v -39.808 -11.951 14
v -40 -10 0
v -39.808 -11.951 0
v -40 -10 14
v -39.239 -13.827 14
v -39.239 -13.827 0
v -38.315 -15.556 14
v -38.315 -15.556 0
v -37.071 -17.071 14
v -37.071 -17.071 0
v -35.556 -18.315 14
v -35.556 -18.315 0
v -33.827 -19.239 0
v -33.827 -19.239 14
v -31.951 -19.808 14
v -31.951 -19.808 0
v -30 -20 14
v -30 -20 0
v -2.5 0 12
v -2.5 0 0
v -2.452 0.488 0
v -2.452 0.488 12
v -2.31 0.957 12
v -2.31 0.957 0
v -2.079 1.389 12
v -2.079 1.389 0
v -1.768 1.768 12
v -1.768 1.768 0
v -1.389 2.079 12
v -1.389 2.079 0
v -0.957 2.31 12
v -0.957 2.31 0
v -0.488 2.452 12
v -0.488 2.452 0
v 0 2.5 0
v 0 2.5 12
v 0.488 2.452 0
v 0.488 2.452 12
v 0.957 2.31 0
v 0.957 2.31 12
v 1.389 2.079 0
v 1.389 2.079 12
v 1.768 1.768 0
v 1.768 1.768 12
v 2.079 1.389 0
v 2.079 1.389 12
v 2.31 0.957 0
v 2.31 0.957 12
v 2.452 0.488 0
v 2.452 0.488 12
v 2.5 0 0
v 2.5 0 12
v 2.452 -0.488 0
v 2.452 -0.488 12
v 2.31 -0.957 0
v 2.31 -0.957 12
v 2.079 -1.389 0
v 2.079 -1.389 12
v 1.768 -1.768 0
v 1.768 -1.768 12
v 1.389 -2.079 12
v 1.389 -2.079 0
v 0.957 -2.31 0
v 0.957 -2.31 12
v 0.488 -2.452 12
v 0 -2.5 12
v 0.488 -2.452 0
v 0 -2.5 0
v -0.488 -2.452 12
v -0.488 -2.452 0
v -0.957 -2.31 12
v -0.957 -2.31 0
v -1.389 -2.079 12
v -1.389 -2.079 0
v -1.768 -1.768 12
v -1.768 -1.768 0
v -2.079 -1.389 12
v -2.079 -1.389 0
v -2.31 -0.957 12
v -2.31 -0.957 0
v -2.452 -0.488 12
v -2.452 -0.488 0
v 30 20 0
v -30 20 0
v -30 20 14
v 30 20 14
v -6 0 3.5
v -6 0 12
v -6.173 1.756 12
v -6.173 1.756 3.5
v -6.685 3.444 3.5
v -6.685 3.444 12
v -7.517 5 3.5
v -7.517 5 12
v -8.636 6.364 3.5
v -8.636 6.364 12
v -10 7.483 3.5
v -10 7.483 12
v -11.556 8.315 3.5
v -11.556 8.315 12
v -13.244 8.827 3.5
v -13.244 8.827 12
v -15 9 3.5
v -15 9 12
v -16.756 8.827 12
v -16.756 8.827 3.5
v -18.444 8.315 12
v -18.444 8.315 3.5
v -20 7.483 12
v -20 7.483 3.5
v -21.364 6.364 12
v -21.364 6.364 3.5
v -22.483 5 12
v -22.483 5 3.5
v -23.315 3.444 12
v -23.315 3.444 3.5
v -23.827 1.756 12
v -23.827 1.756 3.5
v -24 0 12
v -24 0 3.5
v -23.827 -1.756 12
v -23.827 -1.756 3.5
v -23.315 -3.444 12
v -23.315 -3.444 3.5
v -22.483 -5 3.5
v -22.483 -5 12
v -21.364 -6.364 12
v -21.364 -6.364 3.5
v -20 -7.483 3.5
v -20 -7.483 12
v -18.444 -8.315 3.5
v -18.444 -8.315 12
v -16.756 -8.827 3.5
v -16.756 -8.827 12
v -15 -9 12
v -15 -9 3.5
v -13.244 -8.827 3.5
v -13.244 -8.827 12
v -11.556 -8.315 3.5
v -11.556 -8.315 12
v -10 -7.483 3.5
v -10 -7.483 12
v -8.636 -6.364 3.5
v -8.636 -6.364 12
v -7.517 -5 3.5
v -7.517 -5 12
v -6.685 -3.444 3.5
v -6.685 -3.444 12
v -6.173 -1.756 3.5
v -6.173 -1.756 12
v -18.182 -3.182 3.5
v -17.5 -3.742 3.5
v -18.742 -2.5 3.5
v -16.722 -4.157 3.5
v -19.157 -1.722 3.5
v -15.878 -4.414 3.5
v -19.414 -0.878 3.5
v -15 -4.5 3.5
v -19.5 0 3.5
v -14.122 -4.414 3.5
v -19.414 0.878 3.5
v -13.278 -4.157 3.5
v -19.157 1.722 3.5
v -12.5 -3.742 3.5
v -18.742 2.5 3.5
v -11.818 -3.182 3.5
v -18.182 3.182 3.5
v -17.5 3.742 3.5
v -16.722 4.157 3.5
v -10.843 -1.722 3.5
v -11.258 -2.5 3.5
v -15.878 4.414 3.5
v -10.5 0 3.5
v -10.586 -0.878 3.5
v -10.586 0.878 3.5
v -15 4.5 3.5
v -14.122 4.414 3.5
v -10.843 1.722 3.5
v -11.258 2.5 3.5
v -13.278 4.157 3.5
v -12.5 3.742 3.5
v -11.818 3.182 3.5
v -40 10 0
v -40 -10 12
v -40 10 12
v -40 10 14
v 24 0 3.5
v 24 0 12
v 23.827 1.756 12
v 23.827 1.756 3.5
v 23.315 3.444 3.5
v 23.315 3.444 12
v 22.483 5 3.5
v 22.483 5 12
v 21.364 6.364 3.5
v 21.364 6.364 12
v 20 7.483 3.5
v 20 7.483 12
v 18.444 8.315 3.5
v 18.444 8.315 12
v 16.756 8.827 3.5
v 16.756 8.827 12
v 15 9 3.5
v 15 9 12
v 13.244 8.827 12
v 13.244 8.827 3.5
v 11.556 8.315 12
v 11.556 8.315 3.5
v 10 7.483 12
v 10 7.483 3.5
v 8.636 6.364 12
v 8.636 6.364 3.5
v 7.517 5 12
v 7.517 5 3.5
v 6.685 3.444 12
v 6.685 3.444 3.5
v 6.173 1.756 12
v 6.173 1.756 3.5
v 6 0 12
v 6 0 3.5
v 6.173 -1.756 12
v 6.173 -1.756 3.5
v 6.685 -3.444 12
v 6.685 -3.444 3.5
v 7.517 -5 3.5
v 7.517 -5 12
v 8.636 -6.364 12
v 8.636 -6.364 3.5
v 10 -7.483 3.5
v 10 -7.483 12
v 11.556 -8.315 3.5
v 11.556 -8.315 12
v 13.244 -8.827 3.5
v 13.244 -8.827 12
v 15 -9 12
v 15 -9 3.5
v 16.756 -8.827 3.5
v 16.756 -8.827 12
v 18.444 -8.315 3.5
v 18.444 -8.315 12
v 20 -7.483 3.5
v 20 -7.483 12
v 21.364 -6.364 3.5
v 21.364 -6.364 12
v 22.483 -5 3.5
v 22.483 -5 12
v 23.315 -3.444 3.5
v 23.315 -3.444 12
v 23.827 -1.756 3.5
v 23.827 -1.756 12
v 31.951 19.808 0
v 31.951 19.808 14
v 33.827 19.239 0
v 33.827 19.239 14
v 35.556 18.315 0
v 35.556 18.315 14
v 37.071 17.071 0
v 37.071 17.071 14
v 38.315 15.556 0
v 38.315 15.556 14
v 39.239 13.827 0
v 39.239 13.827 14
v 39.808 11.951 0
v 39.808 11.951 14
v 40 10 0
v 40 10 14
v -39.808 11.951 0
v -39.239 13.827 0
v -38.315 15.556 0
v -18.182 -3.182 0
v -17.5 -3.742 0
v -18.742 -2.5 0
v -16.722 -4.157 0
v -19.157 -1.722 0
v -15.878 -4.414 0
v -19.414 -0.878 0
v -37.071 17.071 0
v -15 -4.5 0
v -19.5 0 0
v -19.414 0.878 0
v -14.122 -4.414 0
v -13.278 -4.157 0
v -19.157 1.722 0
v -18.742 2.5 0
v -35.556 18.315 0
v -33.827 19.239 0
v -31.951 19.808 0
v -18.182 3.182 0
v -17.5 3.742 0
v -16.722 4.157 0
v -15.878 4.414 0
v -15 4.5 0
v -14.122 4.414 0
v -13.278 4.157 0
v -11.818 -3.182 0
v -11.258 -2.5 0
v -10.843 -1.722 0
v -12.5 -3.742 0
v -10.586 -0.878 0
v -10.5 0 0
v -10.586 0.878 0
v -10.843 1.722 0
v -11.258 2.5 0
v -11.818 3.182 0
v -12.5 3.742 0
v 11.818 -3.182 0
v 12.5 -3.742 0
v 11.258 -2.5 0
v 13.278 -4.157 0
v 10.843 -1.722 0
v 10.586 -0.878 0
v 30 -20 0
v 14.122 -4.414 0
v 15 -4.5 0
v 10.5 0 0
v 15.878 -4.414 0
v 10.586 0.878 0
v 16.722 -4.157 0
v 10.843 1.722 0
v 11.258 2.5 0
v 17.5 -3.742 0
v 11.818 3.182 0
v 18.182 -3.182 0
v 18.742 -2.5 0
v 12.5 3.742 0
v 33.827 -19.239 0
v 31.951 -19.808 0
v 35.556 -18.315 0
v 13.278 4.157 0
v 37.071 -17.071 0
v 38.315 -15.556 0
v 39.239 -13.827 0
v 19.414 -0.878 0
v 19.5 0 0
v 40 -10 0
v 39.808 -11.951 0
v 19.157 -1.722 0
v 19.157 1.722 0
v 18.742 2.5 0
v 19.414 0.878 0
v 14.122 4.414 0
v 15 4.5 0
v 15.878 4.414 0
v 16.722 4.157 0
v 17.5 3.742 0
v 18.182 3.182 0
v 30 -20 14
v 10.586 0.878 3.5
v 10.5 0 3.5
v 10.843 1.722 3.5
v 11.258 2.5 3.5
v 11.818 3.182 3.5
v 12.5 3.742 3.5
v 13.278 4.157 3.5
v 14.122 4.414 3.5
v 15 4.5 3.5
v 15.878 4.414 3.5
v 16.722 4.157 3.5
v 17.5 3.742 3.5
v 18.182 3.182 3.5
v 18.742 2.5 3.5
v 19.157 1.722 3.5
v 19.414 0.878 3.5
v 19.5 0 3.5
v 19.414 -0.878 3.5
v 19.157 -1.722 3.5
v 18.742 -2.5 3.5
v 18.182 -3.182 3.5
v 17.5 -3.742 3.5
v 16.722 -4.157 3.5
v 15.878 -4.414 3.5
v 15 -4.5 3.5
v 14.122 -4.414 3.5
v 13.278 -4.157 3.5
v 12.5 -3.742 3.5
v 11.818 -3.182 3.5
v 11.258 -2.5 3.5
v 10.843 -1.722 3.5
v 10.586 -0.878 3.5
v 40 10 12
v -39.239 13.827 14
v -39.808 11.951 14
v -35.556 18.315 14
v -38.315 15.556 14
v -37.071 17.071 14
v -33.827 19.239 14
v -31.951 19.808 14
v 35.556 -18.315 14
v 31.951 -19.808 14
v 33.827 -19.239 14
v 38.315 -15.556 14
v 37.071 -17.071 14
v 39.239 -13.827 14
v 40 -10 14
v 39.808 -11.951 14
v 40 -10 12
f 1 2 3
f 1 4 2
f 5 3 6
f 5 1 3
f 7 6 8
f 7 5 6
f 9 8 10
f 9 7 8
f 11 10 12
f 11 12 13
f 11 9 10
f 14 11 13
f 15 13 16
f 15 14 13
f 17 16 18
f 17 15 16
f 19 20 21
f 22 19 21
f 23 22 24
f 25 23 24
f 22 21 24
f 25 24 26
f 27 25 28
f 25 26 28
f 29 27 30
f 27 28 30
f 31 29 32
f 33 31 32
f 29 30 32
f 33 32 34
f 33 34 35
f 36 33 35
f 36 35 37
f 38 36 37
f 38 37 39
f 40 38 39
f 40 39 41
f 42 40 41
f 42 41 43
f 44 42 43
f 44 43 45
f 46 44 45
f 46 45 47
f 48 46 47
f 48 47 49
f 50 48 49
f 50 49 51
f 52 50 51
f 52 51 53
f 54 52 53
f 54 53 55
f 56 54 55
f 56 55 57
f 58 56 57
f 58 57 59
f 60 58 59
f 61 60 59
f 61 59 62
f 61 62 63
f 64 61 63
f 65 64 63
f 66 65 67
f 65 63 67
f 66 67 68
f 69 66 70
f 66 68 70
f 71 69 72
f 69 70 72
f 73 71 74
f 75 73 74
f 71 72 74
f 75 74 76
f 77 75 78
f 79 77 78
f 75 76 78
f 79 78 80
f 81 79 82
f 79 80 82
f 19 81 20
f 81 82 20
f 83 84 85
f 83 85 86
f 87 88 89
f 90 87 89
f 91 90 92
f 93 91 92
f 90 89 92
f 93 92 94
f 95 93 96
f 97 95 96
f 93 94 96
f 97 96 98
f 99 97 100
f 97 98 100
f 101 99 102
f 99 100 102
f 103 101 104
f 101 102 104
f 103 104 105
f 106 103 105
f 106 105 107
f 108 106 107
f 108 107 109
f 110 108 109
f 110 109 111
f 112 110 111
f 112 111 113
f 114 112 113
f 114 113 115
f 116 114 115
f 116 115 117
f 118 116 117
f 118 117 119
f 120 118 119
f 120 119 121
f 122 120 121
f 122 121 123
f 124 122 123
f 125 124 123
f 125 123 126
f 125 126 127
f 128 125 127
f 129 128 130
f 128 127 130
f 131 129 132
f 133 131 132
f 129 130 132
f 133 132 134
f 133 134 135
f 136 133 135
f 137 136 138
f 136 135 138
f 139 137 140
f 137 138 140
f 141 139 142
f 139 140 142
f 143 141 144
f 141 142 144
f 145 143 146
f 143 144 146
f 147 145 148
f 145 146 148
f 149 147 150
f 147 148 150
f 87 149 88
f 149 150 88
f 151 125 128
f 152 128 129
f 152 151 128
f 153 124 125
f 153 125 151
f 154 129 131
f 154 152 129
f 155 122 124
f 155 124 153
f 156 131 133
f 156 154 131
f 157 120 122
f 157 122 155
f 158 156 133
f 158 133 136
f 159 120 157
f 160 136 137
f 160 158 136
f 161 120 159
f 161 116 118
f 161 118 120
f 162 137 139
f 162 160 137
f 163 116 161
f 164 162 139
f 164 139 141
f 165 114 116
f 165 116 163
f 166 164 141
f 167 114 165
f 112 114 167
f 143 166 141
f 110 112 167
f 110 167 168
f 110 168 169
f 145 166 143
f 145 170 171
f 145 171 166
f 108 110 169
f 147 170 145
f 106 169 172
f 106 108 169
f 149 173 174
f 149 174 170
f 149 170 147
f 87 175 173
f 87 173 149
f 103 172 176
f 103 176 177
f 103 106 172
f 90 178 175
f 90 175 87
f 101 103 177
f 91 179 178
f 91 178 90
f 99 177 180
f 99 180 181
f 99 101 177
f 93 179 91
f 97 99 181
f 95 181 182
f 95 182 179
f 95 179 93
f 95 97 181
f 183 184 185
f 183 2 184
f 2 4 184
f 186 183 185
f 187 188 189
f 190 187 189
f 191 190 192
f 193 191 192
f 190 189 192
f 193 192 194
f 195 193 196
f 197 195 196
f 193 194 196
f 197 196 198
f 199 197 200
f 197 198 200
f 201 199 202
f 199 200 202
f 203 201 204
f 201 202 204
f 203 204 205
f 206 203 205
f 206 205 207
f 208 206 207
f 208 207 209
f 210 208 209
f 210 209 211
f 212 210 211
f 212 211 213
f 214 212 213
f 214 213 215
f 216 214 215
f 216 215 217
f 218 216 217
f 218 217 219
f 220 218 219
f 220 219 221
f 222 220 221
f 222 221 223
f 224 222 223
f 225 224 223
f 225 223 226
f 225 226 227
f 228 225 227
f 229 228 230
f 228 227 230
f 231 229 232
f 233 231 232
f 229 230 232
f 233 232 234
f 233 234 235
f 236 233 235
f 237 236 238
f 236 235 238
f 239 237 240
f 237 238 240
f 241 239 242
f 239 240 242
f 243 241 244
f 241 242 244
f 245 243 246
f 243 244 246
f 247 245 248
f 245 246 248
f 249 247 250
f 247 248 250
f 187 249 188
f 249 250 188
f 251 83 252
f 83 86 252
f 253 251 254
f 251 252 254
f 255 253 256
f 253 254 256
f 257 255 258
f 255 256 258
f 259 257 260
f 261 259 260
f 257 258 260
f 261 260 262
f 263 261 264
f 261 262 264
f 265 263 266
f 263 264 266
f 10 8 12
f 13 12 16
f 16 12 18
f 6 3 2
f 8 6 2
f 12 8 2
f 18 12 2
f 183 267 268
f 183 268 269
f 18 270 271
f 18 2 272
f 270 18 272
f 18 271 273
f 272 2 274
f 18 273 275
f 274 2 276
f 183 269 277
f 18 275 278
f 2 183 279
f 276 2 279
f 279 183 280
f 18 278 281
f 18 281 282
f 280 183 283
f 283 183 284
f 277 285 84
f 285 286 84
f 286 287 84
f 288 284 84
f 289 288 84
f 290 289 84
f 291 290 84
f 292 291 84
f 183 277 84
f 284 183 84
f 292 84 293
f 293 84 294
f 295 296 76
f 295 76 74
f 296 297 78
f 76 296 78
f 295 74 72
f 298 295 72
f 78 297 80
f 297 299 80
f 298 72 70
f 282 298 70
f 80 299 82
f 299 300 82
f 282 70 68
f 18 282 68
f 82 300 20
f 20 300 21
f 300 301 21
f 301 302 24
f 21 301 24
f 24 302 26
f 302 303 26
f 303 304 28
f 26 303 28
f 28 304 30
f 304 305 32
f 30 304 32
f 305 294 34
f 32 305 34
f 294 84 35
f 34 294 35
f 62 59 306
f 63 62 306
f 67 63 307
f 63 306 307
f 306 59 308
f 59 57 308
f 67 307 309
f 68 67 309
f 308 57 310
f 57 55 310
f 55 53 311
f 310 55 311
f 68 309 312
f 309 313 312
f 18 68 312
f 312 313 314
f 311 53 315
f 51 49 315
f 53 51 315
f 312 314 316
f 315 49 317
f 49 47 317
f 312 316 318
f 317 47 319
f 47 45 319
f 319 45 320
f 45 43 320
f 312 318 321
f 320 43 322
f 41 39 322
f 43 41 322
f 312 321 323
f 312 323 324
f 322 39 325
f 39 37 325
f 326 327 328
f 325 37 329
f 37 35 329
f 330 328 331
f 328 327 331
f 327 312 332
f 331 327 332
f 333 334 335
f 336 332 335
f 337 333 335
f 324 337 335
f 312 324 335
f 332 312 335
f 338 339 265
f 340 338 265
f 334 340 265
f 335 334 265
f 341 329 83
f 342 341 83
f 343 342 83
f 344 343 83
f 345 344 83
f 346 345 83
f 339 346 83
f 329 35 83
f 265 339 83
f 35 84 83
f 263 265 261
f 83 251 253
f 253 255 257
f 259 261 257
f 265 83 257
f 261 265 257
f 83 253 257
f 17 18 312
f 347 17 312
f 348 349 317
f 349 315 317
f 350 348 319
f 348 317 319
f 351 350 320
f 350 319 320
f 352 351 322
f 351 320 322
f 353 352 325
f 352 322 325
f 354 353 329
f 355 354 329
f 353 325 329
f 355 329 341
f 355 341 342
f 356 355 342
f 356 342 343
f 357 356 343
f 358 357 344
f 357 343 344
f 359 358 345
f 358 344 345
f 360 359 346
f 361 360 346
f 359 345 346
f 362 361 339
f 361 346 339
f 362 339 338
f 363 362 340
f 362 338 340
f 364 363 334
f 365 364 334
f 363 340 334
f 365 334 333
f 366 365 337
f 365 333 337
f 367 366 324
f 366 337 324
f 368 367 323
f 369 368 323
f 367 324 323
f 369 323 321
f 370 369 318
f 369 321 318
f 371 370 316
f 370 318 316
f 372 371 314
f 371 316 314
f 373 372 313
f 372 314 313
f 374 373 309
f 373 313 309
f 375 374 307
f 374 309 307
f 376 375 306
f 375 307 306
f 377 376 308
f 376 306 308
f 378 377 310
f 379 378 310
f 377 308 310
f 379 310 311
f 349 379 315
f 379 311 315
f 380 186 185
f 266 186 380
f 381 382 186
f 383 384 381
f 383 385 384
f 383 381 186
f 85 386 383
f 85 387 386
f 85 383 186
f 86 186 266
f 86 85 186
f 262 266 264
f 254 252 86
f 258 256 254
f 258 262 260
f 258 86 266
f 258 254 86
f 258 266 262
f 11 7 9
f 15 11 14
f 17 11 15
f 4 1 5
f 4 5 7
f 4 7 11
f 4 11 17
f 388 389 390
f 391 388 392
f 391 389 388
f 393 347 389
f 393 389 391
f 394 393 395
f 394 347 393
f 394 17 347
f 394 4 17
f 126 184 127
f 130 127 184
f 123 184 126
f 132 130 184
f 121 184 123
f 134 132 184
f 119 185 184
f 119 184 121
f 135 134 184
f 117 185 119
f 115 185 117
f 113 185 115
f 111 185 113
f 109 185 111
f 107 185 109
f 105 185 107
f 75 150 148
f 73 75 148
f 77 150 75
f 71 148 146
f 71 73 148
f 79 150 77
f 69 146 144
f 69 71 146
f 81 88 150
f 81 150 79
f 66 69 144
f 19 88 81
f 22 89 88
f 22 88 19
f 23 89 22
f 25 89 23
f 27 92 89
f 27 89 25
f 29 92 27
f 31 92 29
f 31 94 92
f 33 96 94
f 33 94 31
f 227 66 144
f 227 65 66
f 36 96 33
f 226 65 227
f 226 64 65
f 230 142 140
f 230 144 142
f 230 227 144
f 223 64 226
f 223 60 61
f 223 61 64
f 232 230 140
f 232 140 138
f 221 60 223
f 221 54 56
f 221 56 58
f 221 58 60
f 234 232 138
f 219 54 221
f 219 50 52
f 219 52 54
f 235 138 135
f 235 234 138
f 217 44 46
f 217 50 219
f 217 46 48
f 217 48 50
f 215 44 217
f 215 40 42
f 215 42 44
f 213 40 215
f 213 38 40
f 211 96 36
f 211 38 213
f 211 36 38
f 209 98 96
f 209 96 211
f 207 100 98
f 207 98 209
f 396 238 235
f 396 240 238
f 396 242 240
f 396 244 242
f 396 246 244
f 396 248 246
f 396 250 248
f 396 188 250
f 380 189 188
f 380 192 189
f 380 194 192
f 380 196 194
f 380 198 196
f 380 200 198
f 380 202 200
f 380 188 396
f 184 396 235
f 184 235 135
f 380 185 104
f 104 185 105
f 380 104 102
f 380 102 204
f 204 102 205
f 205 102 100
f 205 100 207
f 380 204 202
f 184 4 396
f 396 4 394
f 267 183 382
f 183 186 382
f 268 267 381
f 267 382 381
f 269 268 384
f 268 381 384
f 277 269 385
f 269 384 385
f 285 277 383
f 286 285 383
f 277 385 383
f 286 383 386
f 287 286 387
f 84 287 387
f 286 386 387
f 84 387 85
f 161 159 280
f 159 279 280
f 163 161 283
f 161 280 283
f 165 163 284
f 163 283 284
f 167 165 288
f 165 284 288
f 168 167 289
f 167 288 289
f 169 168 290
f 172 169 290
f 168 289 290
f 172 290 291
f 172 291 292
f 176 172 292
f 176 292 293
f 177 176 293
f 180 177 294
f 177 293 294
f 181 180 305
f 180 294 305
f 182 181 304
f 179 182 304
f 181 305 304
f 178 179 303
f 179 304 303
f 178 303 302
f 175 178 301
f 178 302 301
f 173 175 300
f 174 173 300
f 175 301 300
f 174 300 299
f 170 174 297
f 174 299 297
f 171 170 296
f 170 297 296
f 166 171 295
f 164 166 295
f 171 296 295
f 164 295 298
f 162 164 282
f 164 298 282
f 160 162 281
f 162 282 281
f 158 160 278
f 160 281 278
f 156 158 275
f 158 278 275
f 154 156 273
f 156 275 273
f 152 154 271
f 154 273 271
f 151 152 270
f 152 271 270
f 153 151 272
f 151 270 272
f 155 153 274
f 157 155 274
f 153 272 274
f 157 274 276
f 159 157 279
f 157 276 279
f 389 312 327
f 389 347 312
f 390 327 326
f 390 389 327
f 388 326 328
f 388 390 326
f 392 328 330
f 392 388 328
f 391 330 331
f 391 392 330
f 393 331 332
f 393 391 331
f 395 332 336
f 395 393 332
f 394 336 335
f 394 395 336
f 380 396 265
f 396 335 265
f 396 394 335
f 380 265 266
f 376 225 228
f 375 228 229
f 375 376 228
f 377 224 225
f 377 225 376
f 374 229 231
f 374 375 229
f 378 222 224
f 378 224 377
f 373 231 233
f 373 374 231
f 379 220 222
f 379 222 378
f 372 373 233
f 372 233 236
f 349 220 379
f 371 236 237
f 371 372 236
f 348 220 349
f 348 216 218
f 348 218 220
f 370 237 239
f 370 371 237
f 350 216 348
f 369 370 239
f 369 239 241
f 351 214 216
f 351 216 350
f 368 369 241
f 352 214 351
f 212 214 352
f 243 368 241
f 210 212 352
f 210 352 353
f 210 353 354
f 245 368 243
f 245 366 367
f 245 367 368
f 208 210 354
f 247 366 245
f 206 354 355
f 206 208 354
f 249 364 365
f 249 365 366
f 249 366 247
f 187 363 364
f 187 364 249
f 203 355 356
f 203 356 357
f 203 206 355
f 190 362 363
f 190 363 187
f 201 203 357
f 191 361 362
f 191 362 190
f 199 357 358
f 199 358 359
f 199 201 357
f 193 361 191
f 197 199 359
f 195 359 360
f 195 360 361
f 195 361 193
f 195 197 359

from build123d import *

# Parameters (mm, degrees)
SKETCH_1_W                   = 80
SKETCH_1_H                   = 40
EXTRUDE_1_DEPTH              = 14
SKETCH_2_W                   = 80
SKETCH_2_H                   = 20
CUT_EXTRUDE_1_DEPTH          = 2
HOLE_WIZARD_M6_1_D           = 5
HOLE_WIZARD_M6_1_DEPTH       = 15
HOLE_WIZARD_M6_1_TIP         = 1.502151548
HOLE_WIZARD_M8_1_D           = 9
HOLE_WIZARD_M8_1_CBORE_D     = 18
HOLE_WIZARD_M8_1_CBORE_DEPTH = 8.5
FILLET_1_R                   = 10


with BuildPart() as part:
    # 草图1 → 凸台-拉伸1 (new body)
    with BuildSketch(Plane.XY):
        Rectangle(SKETCH_1_W, SKETCH_1_H)
    extrude(amount=EXTRUDE_1_DEPTH)

    # 草图2 → 切除-拉伸1 (cut)
    with BuildSketch(Plane.XY.offset(14)):
        Rectangle(SKETCH_2_W, SKETCH_2_H)
    extrude(amount=-CUT_EXTRUDE_1_DEPTH, mode=Mode.SUBTRACT)

    # M6 螺纹孔1
    with Locations(Plane.XY.offset(12)):
        with Locations((0, 0)):
            Hole(HOLE_WIZARD_M6_1_D / 2, depth=HOLE_WIZARD_M6_1_DEPTH)
            with Locations((0, 0, -(HOLE_WIZARD_M6_1_DEPTH + HOLE_WIZARD_M6_1_TIP / 2))):  # 118° drill point
                Cone(0, HOLE_WIZARD_M6_1_D / 2, HOLE_WIZARD_M6_1_TIP, mode=Mode.SUBTRACT)

    # M8 六角头螺栓的柱形沉头孔1 (through all)
    with Locations(Plane.XY.offset(12)):
        with Locations((-15, 0), (15, 0)):
            CounterBoreHole(HOLE_WIZARD_M8_1_D / 2, HOLE_WIZARD_M8_1_CBORE_D / 2, HOLE_WIZARD_M8_1_CBORE_DEPTH)

    # 圆角1
    fillet_1_edges = [part.edges().sort_by_distance(p)[0] for p in [
        (-40, 20, 7),
        (40, 20, 7),
        (40, -20, 7),
        (-40, -20, 7),
    ]]
    fillet(fillet_1_edges, radius=FILLET_1_R - 0.0001)  # a hair under: the kernel refuses the full size


solid = part.part
